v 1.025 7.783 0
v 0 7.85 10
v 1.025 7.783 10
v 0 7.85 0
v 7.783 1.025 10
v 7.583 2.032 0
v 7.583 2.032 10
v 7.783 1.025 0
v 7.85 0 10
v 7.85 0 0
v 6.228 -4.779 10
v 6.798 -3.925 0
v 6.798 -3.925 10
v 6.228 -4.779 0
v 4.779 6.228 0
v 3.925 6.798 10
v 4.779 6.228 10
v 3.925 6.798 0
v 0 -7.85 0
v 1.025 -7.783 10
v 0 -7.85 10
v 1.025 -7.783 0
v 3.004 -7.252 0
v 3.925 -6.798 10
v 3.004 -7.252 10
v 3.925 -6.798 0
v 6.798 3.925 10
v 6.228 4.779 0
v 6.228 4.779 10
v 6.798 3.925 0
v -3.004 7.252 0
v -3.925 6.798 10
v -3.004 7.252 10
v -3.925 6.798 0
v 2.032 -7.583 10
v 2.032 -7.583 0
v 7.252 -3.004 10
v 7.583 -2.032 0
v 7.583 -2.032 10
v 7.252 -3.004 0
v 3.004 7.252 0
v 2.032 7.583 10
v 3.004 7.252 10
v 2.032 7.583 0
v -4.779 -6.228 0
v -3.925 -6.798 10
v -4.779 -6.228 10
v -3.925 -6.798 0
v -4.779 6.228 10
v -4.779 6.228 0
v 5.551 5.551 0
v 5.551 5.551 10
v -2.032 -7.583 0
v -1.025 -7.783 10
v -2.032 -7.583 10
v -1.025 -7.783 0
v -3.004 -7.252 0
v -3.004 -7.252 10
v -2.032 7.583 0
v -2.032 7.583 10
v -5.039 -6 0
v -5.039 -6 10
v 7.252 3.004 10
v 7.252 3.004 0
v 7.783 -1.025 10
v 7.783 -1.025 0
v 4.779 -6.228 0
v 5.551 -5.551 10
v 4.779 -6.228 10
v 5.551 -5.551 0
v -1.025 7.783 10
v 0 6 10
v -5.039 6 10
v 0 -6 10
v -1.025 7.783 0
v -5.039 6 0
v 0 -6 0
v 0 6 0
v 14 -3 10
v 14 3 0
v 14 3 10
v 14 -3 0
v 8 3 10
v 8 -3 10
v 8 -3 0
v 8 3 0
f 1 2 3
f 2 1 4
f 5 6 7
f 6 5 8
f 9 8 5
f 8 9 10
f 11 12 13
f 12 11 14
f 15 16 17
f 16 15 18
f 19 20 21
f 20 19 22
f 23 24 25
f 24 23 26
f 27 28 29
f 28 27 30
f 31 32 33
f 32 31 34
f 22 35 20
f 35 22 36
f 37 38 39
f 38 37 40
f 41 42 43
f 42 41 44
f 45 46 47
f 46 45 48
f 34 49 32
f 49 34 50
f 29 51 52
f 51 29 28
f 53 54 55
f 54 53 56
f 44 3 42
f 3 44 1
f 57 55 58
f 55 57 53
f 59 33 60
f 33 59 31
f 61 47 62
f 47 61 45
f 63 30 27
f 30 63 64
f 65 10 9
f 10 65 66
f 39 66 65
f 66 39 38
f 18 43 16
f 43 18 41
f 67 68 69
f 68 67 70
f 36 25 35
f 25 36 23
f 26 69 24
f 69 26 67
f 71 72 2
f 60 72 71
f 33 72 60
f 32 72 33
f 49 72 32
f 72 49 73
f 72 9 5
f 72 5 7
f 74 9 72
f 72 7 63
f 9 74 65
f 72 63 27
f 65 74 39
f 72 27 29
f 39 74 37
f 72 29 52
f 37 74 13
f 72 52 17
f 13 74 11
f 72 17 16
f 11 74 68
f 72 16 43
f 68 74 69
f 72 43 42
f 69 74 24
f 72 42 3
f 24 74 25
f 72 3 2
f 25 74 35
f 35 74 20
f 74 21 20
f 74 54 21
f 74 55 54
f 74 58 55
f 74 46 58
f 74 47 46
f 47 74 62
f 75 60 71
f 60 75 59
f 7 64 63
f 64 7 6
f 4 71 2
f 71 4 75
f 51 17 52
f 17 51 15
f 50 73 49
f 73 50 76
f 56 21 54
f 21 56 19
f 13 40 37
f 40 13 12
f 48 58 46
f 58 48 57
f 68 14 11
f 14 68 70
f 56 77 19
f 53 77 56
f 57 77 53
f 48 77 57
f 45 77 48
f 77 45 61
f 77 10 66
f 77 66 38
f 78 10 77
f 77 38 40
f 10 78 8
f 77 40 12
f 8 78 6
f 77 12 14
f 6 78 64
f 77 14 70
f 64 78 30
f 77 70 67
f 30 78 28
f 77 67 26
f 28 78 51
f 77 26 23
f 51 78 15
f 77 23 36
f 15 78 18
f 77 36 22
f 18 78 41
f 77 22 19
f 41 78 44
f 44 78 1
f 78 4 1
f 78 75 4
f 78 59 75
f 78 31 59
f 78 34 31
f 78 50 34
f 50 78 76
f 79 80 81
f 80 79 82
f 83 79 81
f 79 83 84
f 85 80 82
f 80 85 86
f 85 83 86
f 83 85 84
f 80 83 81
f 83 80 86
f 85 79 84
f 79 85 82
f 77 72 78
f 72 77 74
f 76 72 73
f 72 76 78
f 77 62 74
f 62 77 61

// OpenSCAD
// Snap-on clip - a flat (10 mm tall) part that snaps onto a round stand rod and holds a piece
// of round tubing next to it, with a bridge joining the two rings. NOVEL general part.
//

rod_d  = 12.7;
tubing_d = 6;
bridge_w = 6;
height = 10;

$fn = 48;

ring_r = rod_d / 2 + 1.5;
open_x = -10;
open_w = 10;

difference() {
    union() {
        cylinder(h = height, d = 2 * ring_r);
        cylinder(h = height, d = tubing_d + 2);
        translate([8, -3, 0]) cube([bridge_w, 6, height]);
    }
    translate([open_x, -open_w / 2 - 1, -0.5]) cube([open_w, open_w + 2, height + 1]);
    translate([15, -2.25 - 1, -0.5]) cube([4.5, 4.5, height + 1]);
}
